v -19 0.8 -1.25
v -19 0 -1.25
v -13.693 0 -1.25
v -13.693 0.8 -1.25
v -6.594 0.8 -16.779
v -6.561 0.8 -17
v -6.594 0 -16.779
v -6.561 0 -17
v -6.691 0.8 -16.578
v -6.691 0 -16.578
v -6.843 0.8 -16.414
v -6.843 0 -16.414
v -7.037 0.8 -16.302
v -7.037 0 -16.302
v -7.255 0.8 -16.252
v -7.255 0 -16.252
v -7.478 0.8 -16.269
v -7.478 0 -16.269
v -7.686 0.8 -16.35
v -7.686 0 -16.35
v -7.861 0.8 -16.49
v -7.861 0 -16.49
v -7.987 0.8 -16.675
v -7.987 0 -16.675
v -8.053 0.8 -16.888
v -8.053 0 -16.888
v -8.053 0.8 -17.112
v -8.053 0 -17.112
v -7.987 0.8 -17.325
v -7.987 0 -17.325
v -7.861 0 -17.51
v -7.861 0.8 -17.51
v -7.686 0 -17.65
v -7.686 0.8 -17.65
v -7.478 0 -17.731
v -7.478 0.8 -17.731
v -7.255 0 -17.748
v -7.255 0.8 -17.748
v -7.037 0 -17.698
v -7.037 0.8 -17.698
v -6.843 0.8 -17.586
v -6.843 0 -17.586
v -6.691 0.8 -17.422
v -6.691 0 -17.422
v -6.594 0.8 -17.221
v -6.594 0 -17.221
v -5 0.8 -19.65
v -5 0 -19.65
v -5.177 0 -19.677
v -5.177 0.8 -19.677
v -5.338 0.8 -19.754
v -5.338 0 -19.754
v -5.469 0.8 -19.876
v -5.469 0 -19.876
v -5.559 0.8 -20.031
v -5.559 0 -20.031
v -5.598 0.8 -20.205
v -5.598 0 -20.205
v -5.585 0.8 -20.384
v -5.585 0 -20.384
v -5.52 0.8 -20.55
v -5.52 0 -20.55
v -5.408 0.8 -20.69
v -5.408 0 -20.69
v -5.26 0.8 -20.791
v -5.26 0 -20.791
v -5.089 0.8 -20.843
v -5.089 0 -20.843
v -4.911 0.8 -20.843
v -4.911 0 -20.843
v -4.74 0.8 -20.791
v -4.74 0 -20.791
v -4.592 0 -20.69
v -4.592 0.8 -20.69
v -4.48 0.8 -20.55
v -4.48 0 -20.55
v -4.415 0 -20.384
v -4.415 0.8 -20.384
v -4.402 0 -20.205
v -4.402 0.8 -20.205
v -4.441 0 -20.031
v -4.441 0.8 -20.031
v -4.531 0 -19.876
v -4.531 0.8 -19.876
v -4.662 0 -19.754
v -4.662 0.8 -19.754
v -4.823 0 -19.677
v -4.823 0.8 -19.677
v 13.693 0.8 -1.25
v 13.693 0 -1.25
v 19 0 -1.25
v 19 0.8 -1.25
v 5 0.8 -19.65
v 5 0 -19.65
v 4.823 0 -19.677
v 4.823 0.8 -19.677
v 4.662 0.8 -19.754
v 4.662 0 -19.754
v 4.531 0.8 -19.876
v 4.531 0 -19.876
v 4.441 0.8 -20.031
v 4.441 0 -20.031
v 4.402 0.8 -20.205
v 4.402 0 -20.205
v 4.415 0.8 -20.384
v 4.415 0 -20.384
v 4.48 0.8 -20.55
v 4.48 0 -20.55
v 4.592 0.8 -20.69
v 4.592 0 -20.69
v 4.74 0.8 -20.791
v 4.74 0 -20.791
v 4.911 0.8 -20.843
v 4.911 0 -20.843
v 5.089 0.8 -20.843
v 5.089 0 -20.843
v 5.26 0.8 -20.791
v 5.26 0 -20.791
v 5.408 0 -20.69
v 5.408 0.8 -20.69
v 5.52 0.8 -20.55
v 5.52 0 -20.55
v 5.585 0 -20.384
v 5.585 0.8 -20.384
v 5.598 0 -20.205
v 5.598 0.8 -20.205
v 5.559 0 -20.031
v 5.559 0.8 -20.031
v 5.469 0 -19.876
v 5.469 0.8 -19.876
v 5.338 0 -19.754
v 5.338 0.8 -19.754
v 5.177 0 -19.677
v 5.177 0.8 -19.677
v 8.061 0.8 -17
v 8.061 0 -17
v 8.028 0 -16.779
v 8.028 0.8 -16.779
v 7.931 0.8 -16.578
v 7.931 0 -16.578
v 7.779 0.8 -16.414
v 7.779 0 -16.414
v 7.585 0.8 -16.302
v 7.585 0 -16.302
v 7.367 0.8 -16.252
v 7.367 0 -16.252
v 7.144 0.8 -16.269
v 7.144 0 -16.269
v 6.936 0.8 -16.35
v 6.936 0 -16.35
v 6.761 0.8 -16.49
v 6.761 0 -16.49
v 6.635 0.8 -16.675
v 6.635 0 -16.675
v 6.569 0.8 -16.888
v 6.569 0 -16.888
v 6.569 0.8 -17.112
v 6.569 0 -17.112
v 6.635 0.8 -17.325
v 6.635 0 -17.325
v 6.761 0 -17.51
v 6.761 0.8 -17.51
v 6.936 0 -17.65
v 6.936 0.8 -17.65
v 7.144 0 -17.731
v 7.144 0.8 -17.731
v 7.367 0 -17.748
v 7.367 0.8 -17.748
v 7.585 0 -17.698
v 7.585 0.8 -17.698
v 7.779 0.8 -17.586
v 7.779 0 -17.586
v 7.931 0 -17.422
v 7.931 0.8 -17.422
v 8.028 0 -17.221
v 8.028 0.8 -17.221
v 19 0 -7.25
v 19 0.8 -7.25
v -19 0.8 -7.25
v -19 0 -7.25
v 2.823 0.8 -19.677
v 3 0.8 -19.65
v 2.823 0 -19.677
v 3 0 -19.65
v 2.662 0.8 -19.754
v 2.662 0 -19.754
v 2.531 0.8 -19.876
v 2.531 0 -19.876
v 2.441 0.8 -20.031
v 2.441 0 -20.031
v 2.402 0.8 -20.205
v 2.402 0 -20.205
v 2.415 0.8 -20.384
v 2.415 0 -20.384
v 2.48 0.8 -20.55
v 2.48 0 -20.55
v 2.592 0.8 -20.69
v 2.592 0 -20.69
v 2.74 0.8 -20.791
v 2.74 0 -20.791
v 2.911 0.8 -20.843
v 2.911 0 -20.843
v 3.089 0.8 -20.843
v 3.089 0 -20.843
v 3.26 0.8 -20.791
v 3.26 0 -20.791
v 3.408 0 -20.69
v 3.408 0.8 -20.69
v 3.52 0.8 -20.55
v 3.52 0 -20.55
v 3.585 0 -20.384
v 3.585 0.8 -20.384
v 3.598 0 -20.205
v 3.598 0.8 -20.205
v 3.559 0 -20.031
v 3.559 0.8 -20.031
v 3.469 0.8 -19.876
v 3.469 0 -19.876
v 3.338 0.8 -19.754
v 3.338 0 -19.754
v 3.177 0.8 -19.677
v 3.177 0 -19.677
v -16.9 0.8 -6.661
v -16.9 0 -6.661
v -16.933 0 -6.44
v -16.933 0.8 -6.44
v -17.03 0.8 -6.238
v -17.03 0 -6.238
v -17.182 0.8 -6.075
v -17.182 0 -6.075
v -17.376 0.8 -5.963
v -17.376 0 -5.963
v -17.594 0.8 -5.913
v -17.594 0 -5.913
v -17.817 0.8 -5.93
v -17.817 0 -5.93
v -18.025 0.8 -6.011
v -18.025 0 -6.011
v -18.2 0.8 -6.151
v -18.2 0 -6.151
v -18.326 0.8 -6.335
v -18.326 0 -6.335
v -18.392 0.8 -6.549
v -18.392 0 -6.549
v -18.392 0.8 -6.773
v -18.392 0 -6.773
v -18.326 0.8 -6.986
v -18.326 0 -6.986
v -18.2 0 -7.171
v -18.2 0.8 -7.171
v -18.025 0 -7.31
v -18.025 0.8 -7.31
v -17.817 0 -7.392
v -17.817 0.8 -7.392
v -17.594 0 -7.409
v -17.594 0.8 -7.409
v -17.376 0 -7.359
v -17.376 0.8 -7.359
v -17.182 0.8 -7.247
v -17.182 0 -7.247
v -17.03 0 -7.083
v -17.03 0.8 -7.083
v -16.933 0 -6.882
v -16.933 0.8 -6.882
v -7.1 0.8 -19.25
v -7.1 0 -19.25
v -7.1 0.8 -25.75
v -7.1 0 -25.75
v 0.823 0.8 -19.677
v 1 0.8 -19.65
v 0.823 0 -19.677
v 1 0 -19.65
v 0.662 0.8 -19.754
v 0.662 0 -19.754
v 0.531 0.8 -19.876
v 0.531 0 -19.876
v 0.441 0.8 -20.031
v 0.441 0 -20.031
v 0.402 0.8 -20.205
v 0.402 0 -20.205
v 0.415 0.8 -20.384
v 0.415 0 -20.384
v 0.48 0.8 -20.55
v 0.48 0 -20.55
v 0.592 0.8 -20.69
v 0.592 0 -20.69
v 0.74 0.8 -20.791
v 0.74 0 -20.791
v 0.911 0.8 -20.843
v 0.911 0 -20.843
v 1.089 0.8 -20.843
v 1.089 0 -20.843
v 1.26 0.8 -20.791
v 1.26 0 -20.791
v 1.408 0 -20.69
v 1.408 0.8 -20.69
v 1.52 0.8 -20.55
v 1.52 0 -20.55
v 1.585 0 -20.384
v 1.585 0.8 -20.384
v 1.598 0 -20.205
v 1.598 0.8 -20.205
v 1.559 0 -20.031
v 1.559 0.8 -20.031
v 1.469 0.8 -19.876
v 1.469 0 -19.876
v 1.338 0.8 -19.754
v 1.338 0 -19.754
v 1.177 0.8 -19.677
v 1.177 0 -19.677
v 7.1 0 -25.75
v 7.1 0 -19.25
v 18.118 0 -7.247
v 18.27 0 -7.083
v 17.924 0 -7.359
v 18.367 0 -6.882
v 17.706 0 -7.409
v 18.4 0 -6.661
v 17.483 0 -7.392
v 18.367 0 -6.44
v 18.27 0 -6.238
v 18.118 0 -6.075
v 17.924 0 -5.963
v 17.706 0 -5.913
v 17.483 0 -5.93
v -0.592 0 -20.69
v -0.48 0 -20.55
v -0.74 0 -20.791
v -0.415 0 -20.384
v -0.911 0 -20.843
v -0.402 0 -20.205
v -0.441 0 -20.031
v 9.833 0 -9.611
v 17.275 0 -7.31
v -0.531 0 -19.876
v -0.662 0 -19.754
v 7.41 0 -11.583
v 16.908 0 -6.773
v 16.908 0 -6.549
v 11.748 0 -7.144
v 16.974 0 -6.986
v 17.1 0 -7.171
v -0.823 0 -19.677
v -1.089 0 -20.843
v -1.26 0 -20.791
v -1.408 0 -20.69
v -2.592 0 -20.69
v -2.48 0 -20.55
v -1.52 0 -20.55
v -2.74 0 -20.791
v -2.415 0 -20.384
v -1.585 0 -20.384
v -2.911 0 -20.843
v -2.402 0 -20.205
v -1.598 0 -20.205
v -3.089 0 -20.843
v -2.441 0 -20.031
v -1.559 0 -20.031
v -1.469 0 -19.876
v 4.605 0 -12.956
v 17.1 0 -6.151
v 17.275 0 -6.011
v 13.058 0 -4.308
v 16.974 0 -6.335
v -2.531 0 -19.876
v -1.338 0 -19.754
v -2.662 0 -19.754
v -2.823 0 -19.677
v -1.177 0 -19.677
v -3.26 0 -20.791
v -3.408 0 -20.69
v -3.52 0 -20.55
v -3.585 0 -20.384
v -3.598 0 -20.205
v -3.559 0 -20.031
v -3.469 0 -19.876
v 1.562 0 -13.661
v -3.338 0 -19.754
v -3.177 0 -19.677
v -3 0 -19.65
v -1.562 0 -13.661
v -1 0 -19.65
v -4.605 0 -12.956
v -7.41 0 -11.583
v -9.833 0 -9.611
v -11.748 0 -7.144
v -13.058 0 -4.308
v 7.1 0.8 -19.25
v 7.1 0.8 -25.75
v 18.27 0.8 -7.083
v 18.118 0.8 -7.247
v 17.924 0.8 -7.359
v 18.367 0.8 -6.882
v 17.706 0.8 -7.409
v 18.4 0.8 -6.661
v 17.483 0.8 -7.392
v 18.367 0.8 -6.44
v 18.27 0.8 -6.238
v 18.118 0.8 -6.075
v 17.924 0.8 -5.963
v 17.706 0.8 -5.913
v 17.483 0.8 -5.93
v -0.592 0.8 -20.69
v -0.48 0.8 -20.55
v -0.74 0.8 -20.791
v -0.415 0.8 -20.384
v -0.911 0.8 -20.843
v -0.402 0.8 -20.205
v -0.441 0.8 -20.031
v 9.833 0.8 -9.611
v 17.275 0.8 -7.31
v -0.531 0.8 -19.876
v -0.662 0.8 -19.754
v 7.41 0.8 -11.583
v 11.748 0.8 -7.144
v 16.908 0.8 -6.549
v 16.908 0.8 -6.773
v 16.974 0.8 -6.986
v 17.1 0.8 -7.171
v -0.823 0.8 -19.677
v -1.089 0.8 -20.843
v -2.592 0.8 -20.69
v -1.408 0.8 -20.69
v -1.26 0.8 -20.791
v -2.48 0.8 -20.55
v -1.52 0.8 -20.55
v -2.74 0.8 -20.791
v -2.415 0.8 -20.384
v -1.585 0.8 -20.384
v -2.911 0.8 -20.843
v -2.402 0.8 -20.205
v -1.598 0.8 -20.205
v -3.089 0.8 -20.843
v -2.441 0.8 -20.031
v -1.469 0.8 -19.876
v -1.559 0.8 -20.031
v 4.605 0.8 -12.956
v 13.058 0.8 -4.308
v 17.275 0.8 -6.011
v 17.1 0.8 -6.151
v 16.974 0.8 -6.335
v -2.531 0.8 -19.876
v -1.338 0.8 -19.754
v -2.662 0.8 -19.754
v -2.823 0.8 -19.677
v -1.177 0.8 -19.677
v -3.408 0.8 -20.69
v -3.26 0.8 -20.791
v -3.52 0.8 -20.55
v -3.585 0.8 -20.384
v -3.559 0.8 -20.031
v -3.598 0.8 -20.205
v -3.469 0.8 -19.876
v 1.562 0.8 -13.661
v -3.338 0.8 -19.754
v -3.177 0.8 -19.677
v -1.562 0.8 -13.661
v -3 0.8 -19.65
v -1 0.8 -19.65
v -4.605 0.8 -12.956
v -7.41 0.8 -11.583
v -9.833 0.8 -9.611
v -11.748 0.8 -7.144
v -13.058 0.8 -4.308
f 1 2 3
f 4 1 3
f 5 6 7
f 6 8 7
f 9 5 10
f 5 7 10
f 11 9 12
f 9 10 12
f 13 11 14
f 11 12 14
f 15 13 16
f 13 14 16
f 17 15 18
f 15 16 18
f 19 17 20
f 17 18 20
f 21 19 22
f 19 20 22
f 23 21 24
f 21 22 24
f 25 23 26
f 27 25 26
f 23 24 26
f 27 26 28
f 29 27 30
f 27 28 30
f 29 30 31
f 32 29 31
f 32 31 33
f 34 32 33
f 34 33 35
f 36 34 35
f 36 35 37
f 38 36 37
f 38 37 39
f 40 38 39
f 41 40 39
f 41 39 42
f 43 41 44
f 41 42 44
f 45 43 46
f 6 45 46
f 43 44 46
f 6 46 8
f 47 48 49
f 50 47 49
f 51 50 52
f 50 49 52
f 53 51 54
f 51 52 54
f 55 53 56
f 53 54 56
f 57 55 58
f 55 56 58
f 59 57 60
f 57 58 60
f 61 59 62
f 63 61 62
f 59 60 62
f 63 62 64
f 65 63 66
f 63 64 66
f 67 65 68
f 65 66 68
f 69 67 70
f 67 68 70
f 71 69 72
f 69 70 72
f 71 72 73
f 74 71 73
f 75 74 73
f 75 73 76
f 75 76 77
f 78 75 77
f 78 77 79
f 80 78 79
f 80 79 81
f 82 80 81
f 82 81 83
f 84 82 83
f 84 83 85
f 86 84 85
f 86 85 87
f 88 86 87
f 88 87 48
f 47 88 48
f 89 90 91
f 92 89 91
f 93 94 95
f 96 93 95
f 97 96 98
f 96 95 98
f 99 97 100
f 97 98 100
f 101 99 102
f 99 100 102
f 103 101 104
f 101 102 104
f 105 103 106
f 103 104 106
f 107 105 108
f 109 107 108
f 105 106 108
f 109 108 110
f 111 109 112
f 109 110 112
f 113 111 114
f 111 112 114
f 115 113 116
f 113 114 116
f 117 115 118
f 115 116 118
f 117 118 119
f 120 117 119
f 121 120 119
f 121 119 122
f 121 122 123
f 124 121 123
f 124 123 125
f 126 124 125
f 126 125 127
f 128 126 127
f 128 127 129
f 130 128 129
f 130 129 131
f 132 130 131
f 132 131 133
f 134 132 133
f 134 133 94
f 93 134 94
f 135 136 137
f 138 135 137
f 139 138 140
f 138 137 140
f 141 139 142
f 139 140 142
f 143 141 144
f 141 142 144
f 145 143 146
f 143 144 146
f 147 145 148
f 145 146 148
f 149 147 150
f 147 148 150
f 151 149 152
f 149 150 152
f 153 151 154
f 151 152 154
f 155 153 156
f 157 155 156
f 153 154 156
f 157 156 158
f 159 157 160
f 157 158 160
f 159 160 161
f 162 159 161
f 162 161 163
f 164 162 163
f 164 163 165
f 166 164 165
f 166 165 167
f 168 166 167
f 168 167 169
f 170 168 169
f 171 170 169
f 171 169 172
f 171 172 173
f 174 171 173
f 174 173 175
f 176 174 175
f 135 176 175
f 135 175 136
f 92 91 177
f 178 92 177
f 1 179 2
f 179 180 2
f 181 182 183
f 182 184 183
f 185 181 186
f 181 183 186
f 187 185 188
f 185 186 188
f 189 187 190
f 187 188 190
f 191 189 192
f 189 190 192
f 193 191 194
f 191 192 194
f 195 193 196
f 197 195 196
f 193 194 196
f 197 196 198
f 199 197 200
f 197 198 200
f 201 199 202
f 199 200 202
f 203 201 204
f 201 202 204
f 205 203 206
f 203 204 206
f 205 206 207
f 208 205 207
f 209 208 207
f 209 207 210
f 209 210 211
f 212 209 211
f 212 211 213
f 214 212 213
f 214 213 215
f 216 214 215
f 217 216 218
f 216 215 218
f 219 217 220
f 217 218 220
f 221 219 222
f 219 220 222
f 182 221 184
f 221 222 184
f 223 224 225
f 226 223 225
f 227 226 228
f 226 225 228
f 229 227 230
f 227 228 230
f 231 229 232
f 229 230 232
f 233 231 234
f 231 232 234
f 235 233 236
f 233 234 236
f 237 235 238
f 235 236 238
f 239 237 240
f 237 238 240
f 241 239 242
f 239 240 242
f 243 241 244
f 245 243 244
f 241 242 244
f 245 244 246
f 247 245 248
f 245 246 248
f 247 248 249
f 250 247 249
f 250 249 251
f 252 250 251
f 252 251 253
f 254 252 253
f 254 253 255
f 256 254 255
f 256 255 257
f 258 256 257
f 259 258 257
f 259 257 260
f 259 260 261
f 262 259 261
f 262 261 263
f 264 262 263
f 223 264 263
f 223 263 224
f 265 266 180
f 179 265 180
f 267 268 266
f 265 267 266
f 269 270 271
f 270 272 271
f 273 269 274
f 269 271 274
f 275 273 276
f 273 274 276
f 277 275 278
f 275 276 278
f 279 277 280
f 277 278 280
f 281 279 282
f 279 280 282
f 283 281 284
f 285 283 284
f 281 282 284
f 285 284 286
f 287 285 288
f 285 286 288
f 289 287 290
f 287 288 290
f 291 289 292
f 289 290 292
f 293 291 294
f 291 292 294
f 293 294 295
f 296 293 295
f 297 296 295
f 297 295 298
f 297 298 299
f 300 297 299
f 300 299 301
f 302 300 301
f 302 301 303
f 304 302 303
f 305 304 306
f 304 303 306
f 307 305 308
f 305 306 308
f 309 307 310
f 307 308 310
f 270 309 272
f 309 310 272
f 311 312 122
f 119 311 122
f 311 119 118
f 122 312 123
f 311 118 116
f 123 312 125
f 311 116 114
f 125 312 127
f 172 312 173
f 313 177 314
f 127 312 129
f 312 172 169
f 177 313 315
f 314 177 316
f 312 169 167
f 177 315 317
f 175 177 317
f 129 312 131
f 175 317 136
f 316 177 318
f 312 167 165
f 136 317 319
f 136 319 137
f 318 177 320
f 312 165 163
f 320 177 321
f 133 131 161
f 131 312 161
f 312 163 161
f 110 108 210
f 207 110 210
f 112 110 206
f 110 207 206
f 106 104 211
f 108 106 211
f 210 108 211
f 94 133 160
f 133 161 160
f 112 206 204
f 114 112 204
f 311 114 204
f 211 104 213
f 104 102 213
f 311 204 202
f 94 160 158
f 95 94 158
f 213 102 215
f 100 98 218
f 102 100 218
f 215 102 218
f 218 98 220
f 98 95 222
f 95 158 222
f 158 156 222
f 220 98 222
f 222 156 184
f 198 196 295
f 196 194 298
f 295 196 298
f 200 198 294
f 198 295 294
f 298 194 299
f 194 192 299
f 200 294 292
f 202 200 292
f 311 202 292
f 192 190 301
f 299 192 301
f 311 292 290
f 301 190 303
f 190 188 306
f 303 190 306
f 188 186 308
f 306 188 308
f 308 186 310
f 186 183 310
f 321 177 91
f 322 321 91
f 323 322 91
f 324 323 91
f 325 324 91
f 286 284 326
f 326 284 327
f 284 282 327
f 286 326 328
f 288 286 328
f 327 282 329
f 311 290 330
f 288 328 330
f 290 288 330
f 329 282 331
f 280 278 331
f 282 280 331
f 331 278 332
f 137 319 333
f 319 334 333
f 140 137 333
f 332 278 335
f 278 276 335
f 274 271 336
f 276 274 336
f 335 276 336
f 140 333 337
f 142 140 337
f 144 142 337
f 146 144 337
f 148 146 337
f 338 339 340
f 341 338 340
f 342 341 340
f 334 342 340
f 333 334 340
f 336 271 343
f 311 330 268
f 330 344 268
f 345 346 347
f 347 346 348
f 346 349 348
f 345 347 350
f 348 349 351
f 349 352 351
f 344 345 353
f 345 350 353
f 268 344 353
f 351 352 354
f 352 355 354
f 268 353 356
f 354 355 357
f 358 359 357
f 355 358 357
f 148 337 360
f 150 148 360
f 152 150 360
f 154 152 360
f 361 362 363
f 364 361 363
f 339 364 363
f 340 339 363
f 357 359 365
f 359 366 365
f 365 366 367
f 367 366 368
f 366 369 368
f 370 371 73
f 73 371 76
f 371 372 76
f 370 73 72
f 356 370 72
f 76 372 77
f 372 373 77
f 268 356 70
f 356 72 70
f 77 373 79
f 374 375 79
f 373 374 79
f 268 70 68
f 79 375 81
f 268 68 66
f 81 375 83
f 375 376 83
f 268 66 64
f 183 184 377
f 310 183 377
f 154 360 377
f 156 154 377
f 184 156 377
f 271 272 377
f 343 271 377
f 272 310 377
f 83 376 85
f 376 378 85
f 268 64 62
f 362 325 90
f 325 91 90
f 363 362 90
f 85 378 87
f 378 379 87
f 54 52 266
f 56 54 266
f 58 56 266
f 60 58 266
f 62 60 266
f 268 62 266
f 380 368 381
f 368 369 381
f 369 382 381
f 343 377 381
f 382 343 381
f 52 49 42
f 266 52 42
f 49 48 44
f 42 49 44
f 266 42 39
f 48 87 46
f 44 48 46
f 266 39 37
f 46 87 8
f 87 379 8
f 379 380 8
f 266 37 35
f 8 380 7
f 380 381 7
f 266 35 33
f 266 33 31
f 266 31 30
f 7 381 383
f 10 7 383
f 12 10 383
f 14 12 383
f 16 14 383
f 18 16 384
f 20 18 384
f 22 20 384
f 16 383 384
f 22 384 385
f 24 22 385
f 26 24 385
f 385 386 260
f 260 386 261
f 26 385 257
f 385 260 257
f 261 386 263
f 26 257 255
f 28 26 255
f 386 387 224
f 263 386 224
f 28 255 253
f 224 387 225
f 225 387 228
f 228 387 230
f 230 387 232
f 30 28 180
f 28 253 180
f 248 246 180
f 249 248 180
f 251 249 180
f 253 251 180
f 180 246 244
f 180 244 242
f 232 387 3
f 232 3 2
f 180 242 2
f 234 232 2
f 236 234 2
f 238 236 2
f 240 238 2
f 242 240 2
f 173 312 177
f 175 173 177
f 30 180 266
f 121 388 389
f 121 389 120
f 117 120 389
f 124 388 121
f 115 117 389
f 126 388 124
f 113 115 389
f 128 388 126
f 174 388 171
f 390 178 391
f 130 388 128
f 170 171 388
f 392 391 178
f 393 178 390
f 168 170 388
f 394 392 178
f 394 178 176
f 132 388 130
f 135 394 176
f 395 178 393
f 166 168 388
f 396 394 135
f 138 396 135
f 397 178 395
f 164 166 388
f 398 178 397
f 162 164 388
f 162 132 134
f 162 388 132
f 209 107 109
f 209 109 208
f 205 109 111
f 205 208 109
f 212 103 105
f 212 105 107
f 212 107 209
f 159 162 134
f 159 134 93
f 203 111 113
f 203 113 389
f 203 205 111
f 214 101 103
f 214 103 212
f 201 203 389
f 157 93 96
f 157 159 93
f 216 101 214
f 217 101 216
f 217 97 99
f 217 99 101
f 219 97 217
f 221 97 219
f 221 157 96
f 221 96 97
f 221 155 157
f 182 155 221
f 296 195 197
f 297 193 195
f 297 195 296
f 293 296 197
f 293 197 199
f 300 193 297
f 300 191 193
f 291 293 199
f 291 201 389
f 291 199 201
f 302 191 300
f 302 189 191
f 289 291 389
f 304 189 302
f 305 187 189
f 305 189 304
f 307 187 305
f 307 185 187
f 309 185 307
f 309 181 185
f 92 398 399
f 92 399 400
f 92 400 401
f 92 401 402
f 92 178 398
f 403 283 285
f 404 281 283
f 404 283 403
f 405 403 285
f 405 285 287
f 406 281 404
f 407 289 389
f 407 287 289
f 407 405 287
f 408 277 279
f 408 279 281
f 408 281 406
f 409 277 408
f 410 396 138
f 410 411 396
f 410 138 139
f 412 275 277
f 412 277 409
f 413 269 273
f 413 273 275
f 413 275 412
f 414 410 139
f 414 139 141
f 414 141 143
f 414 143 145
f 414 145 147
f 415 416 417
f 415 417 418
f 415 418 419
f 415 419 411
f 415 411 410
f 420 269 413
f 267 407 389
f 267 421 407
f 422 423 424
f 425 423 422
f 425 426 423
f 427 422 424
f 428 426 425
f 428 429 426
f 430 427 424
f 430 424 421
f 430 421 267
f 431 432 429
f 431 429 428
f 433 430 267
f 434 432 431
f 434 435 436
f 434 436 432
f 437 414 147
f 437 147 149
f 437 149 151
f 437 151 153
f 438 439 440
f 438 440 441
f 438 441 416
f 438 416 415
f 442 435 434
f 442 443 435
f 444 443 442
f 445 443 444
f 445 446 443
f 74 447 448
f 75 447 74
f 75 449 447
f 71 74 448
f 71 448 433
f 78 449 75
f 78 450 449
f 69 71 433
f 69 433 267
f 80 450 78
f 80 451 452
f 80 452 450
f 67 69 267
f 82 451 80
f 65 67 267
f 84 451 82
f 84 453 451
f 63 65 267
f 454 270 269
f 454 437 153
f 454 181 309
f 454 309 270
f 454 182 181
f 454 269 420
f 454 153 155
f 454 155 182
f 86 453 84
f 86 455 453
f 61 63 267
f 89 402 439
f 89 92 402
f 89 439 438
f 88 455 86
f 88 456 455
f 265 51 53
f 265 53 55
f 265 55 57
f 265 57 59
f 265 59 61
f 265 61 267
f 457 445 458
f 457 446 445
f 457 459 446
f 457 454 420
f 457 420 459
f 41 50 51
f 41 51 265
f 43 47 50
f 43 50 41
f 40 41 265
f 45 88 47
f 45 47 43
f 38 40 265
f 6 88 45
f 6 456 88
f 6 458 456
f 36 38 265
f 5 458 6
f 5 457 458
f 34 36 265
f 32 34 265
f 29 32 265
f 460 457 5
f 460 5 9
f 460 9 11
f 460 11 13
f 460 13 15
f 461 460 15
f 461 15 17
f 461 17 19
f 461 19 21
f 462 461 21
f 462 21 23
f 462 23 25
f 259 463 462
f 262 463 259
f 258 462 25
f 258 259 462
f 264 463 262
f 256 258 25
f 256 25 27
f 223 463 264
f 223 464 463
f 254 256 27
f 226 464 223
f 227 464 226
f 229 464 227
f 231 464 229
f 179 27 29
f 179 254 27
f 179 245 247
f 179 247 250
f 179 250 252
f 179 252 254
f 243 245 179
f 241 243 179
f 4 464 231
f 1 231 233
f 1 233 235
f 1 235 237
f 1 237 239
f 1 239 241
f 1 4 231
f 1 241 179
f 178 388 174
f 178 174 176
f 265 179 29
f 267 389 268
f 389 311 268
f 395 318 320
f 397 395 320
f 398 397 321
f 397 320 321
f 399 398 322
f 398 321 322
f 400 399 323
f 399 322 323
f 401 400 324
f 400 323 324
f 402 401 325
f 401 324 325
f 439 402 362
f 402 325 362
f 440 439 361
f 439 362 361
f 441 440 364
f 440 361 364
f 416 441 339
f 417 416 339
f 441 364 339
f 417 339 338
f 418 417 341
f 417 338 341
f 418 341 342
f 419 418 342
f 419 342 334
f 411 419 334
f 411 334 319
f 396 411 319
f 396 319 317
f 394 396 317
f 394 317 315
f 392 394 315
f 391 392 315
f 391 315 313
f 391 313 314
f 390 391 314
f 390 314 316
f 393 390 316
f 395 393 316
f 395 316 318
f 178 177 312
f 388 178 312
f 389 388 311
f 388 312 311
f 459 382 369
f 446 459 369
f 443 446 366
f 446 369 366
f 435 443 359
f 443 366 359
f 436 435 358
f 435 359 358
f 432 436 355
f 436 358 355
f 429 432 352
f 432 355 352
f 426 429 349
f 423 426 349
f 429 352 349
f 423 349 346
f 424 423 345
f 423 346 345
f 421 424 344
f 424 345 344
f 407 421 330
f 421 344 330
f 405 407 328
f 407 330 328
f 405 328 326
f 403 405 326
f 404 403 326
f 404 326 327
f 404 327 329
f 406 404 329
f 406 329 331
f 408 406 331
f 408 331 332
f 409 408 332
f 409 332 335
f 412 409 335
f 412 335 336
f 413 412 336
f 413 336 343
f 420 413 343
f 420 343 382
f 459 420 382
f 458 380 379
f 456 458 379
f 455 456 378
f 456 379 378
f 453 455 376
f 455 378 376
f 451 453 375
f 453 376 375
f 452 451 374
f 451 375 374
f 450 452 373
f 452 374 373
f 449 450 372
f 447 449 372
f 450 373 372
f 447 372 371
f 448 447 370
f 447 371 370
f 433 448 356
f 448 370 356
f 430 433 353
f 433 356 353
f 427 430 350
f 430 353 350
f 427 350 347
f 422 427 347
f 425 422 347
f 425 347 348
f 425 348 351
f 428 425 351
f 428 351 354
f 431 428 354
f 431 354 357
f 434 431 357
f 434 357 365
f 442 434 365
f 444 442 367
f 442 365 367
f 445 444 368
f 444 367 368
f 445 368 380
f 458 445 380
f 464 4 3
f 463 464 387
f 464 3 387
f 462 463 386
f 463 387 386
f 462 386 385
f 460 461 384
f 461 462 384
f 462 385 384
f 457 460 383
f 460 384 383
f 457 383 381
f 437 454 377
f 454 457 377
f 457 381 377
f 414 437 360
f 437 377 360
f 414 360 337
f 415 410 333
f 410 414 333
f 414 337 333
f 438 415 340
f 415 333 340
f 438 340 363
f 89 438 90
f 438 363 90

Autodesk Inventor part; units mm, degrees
ref_plane "YZ Plane" through (0, 0, 0) normal (1, 0, 0) x (0, 1, 0)
ref_plane "XZ Plane" through (0, 0, 0) normal (0, 1, 0) x (-1, 0, 0)
ref_plane "XY Plane" through (0, 0, 0) normal (0, 0, 1) x (1, 0, 0)
sketch "Sketch11" plane through (0, 0, 0) normal (0, 1, 0) x (-1, 0, 0)
  circle A0 centre (0, 0) radius 13.75
  line L0 (0, -25.75) -> (7.1, -25.75)
  line L1 (7.1, -25.75) -> (7.1, -19.25)
  line L2 (7.1, -19.25) -> (19, -7.25)
  line L3 (19, -7.25) -> (19, -1.25)
  line L4 (19, -1.25) -> (13.6931, -1.25)
  line L5 (0, -25.75) -> (0, -13.75)
  dimension "d82" = 38
  dimension "d83" = 27.5
  dimension "d84" = 14.2
  dimension "d85" = 6
  dimension "d86" = 12
  dimension "d87" = 6.5
  dimension "d88" = 24.5
extrude "Extrusion7" add sketch "Sketch11" along normal blind 0.8 contours A0 L4 L3 L2 L1 L0 L5
mirror "Mirror5" about plane through (0, 0, -13.75) normal (1, 0, 0) of "Extrusion7"
sketch "Sketch12" plane through (0, 0.8, 0) normal (0, 1, 0) x (1, 0, 0)
  line L0 (-7.1, 25.75) -> (7.1, 25.75) projected
  line L1 (0, 0) -> (0, 27.3302) construction
  point P0 (-1, 20.25)
  dimension "d91" = 5.5
  dimension "d92" = 1
hole "Hole5" at (-1, 0.8, -20.25) direction (0, -1, 0) diameter 1.2 end through all
pattern_linear "Rectangular Pattern1" count 6 spacing 2 along (1, 0, 0) of "Hole5" first direction both ways yes
sketch "Sketch13" plane through (0, 0, 0) normal (0, -1, 0) x (1, 0, 0)
  circle A0 centre (-17.65, -6.6609) radius 0.75 projected
  circle A1 centre (-7.3109, -17) radius 0.75 projected
  circle A2 centre (7.3109, -17) radius 0.75 projected
  circle A3 centre (17.65, -6.6609) radius 0.75 projected
  point P0 (0, 0)
extrude "Extrusion8" cut sketch "Sketch13" against normal through all
properties part number "Nema 17 PCB" material "MDF Medium Density Fiberboard"
